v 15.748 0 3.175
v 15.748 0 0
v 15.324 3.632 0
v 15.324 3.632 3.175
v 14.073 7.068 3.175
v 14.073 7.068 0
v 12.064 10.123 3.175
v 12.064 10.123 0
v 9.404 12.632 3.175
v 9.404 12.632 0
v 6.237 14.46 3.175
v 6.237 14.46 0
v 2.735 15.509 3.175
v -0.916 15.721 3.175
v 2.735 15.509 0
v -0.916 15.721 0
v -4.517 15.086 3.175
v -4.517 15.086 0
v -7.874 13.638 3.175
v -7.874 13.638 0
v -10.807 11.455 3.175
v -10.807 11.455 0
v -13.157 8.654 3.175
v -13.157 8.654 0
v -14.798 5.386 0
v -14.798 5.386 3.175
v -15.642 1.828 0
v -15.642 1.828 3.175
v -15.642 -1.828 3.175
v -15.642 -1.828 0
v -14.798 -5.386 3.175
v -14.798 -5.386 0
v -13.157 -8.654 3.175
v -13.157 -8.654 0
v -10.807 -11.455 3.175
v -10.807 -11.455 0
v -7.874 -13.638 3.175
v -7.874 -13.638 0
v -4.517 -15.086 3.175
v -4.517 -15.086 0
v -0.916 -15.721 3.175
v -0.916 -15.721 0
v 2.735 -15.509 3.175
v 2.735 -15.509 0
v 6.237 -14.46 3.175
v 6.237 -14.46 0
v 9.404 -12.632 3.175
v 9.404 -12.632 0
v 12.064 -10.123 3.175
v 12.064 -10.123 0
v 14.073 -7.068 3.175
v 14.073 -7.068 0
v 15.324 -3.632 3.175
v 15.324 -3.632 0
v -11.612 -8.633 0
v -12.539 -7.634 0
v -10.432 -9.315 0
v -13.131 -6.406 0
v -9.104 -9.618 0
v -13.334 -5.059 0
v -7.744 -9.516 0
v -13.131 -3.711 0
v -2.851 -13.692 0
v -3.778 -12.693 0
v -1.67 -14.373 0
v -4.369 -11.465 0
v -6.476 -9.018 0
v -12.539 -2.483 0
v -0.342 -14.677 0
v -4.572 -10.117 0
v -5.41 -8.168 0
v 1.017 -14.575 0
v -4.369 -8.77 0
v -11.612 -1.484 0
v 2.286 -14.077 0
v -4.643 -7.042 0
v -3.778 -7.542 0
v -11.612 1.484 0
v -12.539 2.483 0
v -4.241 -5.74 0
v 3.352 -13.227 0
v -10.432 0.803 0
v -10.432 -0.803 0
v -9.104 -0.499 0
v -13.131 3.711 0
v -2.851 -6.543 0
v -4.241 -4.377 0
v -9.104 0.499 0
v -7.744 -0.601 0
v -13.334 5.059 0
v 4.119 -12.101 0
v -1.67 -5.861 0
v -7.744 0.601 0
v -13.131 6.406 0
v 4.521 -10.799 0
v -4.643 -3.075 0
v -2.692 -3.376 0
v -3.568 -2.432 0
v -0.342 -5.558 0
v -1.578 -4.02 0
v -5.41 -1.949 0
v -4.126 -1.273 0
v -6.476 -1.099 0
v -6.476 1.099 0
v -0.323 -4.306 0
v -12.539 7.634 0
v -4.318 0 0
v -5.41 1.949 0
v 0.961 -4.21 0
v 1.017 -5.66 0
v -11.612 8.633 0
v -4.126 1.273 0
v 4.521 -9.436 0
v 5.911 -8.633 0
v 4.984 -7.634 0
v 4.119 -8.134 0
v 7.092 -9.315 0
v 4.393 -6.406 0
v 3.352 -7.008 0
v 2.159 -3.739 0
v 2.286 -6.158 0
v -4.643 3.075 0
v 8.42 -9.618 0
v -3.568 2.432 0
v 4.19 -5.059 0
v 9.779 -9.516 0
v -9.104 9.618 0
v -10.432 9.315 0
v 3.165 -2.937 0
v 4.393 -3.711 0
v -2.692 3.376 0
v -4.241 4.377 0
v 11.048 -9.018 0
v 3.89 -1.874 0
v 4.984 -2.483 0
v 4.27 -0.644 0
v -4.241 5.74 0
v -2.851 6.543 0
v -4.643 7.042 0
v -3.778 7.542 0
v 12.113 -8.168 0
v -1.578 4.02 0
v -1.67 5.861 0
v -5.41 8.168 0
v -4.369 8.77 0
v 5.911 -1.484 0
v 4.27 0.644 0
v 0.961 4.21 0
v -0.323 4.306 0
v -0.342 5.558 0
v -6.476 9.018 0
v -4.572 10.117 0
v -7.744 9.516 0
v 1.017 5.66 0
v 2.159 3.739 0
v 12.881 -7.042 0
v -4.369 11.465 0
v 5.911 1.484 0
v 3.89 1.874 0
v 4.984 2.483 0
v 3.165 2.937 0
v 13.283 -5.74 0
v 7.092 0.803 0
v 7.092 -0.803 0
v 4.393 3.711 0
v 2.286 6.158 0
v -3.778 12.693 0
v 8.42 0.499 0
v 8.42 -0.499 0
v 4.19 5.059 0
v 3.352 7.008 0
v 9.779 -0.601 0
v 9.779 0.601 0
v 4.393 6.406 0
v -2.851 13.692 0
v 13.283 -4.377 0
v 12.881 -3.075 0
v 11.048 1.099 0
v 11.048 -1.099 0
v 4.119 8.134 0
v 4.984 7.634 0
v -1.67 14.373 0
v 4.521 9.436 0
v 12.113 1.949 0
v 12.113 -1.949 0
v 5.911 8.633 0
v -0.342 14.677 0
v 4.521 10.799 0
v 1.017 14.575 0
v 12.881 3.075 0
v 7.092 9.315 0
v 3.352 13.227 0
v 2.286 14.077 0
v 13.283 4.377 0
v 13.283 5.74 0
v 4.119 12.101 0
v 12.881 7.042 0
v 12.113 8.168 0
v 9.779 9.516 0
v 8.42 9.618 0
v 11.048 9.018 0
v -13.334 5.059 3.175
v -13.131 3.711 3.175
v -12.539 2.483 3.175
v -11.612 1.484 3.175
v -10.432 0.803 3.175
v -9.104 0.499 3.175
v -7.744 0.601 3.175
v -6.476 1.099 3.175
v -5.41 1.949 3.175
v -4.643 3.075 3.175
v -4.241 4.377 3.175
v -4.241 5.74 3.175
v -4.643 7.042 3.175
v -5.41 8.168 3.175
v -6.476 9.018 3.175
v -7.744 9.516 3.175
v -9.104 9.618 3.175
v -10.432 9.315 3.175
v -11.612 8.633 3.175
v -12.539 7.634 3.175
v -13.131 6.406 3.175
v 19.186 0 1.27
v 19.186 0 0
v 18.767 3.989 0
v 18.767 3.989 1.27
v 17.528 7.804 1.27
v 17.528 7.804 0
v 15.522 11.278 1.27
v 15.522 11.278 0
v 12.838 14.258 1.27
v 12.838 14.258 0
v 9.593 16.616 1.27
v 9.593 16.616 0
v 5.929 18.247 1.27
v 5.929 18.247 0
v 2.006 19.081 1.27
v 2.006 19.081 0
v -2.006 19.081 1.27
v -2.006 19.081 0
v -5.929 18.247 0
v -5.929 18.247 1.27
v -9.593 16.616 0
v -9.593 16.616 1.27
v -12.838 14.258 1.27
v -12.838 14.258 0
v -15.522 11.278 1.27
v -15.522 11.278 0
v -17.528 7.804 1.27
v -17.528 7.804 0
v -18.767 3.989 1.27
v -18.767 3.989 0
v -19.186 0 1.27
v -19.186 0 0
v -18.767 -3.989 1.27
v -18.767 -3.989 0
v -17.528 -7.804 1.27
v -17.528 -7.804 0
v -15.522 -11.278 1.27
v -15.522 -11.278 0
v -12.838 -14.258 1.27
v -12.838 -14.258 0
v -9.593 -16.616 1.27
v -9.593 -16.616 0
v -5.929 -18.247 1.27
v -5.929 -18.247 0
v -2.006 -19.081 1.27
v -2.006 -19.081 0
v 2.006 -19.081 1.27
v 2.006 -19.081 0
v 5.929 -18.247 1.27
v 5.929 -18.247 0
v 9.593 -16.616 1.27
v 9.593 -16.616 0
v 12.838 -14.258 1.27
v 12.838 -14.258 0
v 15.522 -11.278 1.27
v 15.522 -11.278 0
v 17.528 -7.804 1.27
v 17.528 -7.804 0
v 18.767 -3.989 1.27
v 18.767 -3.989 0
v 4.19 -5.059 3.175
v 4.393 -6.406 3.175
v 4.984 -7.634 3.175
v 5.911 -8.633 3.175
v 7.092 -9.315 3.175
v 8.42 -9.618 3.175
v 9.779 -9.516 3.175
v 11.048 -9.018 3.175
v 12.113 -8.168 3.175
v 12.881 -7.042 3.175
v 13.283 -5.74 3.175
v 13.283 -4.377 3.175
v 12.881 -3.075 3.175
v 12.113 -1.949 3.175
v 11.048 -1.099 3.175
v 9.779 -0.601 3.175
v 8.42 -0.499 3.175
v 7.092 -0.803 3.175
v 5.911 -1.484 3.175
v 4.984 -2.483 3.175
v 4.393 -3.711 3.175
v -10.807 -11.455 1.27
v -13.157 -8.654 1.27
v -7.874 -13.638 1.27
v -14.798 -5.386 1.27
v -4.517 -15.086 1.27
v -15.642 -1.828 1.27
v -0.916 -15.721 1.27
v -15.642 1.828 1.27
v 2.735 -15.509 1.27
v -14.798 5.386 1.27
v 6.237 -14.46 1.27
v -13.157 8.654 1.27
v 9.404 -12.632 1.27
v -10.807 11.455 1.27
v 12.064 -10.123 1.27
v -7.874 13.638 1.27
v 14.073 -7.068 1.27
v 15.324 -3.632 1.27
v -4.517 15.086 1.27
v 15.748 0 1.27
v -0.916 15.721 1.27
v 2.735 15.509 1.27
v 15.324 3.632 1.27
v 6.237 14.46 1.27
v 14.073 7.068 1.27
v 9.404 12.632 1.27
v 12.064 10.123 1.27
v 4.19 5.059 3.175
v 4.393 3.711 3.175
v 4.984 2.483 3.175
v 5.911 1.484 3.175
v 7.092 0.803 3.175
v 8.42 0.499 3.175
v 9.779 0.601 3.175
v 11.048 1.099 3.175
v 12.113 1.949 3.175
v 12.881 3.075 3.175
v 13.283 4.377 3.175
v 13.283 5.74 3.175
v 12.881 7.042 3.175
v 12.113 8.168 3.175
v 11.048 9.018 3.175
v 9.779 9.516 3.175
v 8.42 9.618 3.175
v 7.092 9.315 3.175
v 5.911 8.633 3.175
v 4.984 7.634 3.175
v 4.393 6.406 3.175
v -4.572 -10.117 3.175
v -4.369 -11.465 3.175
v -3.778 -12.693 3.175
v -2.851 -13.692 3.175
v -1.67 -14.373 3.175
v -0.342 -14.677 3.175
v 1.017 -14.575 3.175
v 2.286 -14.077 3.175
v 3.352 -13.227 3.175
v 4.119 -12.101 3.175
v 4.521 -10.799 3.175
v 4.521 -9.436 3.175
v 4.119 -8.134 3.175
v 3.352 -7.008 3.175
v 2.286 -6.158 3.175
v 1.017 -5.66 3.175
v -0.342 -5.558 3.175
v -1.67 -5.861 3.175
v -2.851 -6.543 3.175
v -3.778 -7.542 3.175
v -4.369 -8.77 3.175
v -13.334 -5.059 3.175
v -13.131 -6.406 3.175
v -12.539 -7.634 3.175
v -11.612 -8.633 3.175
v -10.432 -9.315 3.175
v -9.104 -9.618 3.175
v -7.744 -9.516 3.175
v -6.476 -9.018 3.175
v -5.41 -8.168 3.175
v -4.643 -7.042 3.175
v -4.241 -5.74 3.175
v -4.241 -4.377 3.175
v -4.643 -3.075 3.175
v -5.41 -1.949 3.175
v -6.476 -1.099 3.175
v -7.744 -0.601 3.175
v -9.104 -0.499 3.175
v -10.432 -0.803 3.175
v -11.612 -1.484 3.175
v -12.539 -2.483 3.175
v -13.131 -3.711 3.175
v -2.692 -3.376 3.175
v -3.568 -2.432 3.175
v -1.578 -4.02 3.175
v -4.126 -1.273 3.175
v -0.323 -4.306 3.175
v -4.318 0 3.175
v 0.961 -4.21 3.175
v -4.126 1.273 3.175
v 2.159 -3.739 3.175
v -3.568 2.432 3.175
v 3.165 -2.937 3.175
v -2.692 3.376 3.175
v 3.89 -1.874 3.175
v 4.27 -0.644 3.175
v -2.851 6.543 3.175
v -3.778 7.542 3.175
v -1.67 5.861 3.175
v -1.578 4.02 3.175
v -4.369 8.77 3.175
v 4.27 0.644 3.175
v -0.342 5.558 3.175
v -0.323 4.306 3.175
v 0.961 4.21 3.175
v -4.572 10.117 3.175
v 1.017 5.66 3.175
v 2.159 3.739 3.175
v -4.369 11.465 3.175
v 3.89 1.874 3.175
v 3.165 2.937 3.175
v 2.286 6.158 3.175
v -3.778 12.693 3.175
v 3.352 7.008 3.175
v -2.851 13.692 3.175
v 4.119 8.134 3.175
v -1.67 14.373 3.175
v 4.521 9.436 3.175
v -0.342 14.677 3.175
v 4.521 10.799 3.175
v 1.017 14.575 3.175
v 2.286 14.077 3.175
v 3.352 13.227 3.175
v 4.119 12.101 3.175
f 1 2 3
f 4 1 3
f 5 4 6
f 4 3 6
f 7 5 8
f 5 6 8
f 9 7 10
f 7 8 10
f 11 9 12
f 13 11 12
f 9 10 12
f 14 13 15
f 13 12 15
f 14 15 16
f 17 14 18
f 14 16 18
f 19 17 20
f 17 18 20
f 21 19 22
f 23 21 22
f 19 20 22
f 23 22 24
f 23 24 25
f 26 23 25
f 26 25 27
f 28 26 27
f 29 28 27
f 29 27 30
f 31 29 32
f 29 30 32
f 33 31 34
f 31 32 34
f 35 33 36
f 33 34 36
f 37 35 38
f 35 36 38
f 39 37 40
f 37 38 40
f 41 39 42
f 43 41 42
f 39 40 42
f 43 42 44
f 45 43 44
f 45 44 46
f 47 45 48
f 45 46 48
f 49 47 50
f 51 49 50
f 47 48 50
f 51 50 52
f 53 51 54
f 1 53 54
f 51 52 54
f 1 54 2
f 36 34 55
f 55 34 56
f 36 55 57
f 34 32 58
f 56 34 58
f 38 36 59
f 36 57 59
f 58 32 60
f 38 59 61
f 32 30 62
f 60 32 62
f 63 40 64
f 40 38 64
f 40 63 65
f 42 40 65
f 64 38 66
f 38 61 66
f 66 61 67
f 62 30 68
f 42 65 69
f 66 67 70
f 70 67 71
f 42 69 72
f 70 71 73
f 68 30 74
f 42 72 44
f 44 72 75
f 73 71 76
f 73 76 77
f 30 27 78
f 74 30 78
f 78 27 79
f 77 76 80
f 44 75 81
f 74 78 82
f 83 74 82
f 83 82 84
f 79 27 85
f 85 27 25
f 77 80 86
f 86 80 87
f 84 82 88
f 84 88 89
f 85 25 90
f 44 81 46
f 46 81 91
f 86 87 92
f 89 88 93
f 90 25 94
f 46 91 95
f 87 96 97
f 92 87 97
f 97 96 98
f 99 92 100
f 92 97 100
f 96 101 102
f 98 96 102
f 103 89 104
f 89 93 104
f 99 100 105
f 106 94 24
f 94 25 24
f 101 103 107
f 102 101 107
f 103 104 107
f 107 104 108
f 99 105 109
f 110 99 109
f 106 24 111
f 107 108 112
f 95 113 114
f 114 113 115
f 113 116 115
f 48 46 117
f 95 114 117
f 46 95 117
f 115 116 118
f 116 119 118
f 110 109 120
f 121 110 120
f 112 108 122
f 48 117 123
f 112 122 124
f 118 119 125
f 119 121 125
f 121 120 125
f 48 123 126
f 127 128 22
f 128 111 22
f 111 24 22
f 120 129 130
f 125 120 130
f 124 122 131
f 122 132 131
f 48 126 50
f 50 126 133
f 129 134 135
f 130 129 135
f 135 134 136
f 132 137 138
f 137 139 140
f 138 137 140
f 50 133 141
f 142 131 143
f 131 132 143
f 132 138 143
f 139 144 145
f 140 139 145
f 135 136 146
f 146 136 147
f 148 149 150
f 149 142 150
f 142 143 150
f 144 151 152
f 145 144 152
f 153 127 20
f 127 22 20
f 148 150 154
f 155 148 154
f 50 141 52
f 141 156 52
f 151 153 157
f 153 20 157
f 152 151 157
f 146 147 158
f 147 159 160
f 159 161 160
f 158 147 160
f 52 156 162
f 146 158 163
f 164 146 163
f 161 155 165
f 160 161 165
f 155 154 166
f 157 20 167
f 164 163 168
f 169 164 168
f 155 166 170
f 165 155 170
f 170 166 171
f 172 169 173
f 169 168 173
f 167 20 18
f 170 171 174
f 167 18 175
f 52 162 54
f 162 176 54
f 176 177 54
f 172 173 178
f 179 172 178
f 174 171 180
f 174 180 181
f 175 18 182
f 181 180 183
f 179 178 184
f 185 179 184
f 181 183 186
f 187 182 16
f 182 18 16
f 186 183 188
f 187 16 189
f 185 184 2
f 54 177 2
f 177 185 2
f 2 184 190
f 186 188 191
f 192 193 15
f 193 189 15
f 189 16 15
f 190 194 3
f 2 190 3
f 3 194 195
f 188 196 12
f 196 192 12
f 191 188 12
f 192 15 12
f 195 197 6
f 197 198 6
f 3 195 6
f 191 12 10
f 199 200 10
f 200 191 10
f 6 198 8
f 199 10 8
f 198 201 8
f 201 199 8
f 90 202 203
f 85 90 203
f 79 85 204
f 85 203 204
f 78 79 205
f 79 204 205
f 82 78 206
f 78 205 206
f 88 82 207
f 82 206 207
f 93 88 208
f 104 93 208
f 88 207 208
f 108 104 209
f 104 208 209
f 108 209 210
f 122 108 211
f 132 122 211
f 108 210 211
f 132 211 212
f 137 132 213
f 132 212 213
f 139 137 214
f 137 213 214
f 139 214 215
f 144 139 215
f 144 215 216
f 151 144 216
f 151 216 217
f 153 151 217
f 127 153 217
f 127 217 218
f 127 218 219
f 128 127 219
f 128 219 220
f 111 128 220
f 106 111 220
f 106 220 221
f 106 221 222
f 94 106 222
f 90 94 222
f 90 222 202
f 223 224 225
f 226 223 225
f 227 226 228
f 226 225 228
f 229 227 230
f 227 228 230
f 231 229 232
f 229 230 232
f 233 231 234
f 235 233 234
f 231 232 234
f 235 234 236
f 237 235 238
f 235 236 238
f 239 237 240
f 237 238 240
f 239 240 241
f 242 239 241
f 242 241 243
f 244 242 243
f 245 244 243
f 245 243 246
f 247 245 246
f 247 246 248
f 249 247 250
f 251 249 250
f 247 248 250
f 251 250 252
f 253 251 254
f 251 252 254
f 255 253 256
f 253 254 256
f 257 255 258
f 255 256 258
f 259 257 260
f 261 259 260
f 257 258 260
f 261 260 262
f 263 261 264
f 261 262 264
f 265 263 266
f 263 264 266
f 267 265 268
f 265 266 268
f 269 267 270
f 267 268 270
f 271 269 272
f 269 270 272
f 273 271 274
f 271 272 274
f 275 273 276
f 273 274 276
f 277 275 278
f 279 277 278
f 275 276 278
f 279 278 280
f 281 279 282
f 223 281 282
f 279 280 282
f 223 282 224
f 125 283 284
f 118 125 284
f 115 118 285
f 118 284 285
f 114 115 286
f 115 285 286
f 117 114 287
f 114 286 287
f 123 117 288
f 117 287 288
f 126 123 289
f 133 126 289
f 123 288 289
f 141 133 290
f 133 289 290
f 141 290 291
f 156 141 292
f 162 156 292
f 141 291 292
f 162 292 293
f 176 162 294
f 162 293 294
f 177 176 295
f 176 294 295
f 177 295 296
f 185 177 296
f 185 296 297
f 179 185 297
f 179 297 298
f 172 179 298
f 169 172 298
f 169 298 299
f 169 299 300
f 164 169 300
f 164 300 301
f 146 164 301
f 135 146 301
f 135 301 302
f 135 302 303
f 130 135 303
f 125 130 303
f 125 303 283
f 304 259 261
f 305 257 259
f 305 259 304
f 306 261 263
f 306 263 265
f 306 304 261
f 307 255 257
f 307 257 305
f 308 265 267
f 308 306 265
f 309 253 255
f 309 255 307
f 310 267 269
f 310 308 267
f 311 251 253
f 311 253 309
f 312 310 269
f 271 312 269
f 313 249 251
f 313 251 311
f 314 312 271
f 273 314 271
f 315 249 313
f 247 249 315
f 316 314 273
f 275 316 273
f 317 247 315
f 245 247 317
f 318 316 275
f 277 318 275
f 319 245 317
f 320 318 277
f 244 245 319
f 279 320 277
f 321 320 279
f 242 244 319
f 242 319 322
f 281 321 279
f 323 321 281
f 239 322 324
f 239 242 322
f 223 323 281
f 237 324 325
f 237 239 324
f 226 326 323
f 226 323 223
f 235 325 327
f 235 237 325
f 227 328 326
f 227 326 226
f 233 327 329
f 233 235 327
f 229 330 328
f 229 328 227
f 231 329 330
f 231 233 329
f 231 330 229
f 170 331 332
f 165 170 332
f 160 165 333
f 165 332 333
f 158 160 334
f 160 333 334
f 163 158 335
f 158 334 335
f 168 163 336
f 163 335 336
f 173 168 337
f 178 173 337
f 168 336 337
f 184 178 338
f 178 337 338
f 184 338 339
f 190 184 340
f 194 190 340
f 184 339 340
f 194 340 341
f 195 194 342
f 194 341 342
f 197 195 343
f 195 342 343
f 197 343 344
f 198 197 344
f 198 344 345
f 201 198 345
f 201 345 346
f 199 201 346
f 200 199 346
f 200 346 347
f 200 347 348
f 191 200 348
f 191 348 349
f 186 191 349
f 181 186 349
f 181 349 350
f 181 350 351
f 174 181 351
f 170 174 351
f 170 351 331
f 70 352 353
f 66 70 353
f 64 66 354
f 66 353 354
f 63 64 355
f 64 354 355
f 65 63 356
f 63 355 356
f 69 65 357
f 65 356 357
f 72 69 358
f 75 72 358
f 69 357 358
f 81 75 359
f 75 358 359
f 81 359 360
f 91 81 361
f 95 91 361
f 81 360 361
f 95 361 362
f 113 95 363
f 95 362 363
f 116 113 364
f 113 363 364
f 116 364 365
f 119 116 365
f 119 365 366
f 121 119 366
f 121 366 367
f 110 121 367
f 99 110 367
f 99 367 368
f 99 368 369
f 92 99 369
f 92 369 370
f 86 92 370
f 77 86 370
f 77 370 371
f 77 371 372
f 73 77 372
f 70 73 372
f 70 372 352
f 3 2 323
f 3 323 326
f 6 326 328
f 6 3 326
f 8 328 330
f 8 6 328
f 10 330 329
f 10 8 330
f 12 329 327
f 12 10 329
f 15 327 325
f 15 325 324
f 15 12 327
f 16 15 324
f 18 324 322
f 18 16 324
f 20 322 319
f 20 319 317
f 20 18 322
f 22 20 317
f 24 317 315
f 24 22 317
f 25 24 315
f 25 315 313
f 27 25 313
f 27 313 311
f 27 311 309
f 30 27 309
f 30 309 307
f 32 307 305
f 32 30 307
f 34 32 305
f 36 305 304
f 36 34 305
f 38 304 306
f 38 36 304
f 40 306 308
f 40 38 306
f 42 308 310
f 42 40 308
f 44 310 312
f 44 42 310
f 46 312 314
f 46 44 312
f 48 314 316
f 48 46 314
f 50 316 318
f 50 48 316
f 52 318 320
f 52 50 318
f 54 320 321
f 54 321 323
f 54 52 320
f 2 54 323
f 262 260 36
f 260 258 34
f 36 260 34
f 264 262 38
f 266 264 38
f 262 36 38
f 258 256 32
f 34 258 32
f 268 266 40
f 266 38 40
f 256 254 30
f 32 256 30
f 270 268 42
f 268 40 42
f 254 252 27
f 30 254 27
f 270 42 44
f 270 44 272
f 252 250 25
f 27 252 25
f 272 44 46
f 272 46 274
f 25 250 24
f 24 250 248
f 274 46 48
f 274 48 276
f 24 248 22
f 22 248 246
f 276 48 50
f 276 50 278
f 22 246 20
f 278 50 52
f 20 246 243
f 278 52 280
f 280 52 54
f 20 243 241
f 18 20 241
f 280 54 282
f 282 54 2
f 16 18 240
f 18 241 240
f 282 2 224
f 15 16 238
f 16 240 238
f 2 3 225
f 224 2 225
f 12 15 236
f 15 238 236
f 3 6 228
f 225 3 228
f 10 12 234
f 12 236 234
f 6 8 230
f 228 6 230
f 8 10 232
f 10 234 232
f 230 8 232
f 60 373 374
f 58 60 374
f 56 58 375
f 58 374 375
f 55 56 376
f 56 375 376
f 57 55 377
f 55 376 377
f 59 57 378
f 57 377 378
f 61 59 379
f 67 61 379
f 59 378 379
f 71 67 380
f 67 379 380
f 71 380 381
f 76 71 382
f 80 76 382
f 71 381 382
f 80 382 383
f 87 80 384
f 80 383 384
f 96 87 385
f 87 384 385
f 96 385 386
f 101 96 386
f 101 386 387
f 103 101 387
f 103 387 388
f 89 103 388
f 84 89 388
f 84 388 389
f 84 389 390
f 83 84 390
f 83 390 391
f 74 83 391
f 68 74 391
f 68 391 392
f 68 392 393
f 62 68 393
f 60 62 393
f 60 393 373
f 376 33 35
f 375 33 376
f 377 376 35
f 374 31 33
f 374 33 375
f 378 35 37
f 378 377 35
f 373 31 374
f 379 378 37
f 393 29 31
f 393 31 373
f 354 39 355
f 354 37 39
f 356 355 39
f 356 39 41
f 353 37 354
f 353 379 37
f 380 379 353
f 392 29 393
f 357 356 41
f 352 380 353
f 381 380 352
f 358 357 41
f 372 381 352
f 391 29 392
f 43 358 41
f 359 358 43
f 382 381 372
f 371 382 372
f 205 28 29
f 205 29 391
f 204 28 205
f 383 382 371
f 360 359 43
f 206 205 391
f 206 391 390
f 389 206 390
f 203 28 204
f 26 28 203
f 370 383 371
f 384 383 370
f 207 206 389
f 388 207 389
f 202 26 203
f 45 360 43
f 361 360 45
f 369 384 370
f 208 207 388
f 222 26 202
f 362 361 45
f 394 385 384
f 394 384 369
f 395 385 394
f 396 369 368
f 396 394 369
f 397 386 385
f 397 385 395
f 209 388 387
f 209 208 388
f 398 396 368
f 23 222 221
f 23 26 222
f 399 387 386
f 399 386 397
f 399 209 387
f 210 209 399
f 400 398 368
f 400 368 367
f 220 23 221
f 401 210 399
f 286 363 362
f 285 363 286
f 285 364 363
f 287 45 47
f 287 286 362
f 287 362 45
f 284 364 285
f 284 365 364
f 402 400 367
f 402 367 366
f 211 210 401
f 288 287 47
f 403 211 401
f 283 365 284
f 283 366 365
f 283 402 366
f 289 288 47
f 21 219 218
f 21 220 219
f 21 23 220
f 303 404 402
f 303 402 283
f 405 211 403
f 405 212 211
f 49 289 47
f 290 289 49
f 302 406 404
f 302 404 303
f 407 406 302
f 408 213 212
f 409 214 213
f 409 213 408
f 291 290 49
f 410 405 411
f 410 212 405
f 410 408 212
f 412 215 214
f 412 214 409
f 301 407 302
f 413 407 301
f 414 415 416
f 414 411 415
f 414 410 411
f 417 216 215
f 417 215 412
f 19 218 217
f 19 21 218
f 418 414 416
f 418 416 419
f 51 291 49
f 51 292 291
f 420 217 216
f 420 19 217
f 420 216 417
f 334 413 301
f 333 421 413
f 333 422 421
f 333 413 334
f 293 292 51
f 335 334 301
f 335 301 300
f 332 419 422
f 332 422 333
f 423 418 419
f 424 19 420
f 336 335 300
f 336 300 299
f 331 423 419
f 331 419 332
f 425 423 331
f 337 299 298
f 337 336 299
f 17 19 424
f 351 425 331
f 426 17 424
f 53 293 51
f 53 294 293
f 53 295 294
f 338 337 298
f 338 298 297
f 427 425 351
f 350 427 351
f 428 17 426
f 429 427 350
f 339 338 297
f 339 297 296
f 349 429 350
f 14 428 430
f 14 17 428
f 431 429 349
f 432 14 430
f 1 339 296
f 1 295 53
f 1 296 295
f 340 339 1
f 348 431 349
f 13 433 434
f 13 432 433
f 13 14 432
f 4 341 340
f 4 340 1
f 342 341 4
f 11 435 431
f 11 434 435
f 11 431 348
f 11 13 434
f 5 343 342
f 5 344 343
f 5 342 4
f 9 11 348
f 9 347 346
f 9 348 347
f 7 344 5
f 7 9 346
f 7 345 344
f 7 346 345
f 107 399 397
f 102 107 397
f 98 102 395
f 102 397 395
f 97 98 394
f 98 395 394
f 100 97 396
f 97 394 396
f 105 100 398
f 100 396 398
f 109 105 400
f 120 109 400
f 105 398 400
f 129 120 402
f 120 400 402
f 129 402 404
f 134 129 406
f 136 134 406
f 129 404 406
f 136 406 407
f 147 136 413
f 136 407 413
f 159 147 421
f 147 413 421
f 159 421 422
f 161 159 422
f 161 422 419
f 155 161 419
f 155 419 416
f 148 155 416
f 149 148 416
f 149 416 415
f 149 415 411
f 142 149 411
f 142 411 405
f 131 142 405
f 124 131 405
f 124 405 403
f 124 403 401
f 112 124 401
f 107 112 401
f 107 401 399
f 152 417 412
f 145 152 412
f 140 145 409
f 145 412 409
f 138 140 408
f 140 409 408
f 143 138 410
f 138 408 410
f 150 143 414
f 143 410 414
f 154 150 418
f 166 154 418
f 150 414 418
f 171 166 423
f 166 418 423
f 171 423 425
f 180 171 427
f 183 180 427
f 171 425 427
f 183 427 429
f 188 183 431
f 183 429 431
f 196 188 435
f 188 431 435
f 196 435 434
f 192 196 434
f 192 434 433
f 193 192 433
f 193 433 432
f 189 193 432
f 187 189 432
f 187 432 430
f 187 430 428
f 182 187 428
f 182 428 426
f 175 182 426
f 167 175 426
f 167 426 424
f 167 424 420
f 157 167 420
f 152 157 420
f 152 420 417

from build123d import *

# Parameters (mm, degrees)
F0_R     = 15.748
F1_DEPTH = 3.175
F0_R_2   = 19.186467
F2_DEPTH = 1.27
F3_D     = 8.636
F4_D     = 9.144


with BuildPart() as f1:
    # F0 (on Top) → F1 (new body)
    with BuildSketch(Plane.XY):
        Circle(F0_R)
    extrude(amount=F1_DEPTH)

    # F3 (through all)
    with Locations(Plane(origin=(0, 0, 0), x_dir=(1, 0, 0), z_dir=(0, 0, -1))):
        with Locations((0, 0)):
            Hole(F3_D / 2)

    # F4 (through all)
    with Locations(Plane(origin=(0, 0, 0), x_dir=(1, 0, 0), z_dir=(0, 0, -1))):
        with Locations((0, 10.117323), (8.761859, 5.058662), (8.761859, -5.058662), (0, -10.117323), (-8.761859, -5.058662), (-8.761859, 5.058662)):
            Hole(F4_D / 2)


with BuildPart() as f2:
    # F0 (on Top) → F2 (new body)
    with BuildSketch(Plane.XY):
        Circle(F0_R_2)
        Circle(F0_R, mode=Mode.SUBTRACT)
    extrude(amount=F2_DEPTH)


solid = Compound([f1.part, f2.part])
